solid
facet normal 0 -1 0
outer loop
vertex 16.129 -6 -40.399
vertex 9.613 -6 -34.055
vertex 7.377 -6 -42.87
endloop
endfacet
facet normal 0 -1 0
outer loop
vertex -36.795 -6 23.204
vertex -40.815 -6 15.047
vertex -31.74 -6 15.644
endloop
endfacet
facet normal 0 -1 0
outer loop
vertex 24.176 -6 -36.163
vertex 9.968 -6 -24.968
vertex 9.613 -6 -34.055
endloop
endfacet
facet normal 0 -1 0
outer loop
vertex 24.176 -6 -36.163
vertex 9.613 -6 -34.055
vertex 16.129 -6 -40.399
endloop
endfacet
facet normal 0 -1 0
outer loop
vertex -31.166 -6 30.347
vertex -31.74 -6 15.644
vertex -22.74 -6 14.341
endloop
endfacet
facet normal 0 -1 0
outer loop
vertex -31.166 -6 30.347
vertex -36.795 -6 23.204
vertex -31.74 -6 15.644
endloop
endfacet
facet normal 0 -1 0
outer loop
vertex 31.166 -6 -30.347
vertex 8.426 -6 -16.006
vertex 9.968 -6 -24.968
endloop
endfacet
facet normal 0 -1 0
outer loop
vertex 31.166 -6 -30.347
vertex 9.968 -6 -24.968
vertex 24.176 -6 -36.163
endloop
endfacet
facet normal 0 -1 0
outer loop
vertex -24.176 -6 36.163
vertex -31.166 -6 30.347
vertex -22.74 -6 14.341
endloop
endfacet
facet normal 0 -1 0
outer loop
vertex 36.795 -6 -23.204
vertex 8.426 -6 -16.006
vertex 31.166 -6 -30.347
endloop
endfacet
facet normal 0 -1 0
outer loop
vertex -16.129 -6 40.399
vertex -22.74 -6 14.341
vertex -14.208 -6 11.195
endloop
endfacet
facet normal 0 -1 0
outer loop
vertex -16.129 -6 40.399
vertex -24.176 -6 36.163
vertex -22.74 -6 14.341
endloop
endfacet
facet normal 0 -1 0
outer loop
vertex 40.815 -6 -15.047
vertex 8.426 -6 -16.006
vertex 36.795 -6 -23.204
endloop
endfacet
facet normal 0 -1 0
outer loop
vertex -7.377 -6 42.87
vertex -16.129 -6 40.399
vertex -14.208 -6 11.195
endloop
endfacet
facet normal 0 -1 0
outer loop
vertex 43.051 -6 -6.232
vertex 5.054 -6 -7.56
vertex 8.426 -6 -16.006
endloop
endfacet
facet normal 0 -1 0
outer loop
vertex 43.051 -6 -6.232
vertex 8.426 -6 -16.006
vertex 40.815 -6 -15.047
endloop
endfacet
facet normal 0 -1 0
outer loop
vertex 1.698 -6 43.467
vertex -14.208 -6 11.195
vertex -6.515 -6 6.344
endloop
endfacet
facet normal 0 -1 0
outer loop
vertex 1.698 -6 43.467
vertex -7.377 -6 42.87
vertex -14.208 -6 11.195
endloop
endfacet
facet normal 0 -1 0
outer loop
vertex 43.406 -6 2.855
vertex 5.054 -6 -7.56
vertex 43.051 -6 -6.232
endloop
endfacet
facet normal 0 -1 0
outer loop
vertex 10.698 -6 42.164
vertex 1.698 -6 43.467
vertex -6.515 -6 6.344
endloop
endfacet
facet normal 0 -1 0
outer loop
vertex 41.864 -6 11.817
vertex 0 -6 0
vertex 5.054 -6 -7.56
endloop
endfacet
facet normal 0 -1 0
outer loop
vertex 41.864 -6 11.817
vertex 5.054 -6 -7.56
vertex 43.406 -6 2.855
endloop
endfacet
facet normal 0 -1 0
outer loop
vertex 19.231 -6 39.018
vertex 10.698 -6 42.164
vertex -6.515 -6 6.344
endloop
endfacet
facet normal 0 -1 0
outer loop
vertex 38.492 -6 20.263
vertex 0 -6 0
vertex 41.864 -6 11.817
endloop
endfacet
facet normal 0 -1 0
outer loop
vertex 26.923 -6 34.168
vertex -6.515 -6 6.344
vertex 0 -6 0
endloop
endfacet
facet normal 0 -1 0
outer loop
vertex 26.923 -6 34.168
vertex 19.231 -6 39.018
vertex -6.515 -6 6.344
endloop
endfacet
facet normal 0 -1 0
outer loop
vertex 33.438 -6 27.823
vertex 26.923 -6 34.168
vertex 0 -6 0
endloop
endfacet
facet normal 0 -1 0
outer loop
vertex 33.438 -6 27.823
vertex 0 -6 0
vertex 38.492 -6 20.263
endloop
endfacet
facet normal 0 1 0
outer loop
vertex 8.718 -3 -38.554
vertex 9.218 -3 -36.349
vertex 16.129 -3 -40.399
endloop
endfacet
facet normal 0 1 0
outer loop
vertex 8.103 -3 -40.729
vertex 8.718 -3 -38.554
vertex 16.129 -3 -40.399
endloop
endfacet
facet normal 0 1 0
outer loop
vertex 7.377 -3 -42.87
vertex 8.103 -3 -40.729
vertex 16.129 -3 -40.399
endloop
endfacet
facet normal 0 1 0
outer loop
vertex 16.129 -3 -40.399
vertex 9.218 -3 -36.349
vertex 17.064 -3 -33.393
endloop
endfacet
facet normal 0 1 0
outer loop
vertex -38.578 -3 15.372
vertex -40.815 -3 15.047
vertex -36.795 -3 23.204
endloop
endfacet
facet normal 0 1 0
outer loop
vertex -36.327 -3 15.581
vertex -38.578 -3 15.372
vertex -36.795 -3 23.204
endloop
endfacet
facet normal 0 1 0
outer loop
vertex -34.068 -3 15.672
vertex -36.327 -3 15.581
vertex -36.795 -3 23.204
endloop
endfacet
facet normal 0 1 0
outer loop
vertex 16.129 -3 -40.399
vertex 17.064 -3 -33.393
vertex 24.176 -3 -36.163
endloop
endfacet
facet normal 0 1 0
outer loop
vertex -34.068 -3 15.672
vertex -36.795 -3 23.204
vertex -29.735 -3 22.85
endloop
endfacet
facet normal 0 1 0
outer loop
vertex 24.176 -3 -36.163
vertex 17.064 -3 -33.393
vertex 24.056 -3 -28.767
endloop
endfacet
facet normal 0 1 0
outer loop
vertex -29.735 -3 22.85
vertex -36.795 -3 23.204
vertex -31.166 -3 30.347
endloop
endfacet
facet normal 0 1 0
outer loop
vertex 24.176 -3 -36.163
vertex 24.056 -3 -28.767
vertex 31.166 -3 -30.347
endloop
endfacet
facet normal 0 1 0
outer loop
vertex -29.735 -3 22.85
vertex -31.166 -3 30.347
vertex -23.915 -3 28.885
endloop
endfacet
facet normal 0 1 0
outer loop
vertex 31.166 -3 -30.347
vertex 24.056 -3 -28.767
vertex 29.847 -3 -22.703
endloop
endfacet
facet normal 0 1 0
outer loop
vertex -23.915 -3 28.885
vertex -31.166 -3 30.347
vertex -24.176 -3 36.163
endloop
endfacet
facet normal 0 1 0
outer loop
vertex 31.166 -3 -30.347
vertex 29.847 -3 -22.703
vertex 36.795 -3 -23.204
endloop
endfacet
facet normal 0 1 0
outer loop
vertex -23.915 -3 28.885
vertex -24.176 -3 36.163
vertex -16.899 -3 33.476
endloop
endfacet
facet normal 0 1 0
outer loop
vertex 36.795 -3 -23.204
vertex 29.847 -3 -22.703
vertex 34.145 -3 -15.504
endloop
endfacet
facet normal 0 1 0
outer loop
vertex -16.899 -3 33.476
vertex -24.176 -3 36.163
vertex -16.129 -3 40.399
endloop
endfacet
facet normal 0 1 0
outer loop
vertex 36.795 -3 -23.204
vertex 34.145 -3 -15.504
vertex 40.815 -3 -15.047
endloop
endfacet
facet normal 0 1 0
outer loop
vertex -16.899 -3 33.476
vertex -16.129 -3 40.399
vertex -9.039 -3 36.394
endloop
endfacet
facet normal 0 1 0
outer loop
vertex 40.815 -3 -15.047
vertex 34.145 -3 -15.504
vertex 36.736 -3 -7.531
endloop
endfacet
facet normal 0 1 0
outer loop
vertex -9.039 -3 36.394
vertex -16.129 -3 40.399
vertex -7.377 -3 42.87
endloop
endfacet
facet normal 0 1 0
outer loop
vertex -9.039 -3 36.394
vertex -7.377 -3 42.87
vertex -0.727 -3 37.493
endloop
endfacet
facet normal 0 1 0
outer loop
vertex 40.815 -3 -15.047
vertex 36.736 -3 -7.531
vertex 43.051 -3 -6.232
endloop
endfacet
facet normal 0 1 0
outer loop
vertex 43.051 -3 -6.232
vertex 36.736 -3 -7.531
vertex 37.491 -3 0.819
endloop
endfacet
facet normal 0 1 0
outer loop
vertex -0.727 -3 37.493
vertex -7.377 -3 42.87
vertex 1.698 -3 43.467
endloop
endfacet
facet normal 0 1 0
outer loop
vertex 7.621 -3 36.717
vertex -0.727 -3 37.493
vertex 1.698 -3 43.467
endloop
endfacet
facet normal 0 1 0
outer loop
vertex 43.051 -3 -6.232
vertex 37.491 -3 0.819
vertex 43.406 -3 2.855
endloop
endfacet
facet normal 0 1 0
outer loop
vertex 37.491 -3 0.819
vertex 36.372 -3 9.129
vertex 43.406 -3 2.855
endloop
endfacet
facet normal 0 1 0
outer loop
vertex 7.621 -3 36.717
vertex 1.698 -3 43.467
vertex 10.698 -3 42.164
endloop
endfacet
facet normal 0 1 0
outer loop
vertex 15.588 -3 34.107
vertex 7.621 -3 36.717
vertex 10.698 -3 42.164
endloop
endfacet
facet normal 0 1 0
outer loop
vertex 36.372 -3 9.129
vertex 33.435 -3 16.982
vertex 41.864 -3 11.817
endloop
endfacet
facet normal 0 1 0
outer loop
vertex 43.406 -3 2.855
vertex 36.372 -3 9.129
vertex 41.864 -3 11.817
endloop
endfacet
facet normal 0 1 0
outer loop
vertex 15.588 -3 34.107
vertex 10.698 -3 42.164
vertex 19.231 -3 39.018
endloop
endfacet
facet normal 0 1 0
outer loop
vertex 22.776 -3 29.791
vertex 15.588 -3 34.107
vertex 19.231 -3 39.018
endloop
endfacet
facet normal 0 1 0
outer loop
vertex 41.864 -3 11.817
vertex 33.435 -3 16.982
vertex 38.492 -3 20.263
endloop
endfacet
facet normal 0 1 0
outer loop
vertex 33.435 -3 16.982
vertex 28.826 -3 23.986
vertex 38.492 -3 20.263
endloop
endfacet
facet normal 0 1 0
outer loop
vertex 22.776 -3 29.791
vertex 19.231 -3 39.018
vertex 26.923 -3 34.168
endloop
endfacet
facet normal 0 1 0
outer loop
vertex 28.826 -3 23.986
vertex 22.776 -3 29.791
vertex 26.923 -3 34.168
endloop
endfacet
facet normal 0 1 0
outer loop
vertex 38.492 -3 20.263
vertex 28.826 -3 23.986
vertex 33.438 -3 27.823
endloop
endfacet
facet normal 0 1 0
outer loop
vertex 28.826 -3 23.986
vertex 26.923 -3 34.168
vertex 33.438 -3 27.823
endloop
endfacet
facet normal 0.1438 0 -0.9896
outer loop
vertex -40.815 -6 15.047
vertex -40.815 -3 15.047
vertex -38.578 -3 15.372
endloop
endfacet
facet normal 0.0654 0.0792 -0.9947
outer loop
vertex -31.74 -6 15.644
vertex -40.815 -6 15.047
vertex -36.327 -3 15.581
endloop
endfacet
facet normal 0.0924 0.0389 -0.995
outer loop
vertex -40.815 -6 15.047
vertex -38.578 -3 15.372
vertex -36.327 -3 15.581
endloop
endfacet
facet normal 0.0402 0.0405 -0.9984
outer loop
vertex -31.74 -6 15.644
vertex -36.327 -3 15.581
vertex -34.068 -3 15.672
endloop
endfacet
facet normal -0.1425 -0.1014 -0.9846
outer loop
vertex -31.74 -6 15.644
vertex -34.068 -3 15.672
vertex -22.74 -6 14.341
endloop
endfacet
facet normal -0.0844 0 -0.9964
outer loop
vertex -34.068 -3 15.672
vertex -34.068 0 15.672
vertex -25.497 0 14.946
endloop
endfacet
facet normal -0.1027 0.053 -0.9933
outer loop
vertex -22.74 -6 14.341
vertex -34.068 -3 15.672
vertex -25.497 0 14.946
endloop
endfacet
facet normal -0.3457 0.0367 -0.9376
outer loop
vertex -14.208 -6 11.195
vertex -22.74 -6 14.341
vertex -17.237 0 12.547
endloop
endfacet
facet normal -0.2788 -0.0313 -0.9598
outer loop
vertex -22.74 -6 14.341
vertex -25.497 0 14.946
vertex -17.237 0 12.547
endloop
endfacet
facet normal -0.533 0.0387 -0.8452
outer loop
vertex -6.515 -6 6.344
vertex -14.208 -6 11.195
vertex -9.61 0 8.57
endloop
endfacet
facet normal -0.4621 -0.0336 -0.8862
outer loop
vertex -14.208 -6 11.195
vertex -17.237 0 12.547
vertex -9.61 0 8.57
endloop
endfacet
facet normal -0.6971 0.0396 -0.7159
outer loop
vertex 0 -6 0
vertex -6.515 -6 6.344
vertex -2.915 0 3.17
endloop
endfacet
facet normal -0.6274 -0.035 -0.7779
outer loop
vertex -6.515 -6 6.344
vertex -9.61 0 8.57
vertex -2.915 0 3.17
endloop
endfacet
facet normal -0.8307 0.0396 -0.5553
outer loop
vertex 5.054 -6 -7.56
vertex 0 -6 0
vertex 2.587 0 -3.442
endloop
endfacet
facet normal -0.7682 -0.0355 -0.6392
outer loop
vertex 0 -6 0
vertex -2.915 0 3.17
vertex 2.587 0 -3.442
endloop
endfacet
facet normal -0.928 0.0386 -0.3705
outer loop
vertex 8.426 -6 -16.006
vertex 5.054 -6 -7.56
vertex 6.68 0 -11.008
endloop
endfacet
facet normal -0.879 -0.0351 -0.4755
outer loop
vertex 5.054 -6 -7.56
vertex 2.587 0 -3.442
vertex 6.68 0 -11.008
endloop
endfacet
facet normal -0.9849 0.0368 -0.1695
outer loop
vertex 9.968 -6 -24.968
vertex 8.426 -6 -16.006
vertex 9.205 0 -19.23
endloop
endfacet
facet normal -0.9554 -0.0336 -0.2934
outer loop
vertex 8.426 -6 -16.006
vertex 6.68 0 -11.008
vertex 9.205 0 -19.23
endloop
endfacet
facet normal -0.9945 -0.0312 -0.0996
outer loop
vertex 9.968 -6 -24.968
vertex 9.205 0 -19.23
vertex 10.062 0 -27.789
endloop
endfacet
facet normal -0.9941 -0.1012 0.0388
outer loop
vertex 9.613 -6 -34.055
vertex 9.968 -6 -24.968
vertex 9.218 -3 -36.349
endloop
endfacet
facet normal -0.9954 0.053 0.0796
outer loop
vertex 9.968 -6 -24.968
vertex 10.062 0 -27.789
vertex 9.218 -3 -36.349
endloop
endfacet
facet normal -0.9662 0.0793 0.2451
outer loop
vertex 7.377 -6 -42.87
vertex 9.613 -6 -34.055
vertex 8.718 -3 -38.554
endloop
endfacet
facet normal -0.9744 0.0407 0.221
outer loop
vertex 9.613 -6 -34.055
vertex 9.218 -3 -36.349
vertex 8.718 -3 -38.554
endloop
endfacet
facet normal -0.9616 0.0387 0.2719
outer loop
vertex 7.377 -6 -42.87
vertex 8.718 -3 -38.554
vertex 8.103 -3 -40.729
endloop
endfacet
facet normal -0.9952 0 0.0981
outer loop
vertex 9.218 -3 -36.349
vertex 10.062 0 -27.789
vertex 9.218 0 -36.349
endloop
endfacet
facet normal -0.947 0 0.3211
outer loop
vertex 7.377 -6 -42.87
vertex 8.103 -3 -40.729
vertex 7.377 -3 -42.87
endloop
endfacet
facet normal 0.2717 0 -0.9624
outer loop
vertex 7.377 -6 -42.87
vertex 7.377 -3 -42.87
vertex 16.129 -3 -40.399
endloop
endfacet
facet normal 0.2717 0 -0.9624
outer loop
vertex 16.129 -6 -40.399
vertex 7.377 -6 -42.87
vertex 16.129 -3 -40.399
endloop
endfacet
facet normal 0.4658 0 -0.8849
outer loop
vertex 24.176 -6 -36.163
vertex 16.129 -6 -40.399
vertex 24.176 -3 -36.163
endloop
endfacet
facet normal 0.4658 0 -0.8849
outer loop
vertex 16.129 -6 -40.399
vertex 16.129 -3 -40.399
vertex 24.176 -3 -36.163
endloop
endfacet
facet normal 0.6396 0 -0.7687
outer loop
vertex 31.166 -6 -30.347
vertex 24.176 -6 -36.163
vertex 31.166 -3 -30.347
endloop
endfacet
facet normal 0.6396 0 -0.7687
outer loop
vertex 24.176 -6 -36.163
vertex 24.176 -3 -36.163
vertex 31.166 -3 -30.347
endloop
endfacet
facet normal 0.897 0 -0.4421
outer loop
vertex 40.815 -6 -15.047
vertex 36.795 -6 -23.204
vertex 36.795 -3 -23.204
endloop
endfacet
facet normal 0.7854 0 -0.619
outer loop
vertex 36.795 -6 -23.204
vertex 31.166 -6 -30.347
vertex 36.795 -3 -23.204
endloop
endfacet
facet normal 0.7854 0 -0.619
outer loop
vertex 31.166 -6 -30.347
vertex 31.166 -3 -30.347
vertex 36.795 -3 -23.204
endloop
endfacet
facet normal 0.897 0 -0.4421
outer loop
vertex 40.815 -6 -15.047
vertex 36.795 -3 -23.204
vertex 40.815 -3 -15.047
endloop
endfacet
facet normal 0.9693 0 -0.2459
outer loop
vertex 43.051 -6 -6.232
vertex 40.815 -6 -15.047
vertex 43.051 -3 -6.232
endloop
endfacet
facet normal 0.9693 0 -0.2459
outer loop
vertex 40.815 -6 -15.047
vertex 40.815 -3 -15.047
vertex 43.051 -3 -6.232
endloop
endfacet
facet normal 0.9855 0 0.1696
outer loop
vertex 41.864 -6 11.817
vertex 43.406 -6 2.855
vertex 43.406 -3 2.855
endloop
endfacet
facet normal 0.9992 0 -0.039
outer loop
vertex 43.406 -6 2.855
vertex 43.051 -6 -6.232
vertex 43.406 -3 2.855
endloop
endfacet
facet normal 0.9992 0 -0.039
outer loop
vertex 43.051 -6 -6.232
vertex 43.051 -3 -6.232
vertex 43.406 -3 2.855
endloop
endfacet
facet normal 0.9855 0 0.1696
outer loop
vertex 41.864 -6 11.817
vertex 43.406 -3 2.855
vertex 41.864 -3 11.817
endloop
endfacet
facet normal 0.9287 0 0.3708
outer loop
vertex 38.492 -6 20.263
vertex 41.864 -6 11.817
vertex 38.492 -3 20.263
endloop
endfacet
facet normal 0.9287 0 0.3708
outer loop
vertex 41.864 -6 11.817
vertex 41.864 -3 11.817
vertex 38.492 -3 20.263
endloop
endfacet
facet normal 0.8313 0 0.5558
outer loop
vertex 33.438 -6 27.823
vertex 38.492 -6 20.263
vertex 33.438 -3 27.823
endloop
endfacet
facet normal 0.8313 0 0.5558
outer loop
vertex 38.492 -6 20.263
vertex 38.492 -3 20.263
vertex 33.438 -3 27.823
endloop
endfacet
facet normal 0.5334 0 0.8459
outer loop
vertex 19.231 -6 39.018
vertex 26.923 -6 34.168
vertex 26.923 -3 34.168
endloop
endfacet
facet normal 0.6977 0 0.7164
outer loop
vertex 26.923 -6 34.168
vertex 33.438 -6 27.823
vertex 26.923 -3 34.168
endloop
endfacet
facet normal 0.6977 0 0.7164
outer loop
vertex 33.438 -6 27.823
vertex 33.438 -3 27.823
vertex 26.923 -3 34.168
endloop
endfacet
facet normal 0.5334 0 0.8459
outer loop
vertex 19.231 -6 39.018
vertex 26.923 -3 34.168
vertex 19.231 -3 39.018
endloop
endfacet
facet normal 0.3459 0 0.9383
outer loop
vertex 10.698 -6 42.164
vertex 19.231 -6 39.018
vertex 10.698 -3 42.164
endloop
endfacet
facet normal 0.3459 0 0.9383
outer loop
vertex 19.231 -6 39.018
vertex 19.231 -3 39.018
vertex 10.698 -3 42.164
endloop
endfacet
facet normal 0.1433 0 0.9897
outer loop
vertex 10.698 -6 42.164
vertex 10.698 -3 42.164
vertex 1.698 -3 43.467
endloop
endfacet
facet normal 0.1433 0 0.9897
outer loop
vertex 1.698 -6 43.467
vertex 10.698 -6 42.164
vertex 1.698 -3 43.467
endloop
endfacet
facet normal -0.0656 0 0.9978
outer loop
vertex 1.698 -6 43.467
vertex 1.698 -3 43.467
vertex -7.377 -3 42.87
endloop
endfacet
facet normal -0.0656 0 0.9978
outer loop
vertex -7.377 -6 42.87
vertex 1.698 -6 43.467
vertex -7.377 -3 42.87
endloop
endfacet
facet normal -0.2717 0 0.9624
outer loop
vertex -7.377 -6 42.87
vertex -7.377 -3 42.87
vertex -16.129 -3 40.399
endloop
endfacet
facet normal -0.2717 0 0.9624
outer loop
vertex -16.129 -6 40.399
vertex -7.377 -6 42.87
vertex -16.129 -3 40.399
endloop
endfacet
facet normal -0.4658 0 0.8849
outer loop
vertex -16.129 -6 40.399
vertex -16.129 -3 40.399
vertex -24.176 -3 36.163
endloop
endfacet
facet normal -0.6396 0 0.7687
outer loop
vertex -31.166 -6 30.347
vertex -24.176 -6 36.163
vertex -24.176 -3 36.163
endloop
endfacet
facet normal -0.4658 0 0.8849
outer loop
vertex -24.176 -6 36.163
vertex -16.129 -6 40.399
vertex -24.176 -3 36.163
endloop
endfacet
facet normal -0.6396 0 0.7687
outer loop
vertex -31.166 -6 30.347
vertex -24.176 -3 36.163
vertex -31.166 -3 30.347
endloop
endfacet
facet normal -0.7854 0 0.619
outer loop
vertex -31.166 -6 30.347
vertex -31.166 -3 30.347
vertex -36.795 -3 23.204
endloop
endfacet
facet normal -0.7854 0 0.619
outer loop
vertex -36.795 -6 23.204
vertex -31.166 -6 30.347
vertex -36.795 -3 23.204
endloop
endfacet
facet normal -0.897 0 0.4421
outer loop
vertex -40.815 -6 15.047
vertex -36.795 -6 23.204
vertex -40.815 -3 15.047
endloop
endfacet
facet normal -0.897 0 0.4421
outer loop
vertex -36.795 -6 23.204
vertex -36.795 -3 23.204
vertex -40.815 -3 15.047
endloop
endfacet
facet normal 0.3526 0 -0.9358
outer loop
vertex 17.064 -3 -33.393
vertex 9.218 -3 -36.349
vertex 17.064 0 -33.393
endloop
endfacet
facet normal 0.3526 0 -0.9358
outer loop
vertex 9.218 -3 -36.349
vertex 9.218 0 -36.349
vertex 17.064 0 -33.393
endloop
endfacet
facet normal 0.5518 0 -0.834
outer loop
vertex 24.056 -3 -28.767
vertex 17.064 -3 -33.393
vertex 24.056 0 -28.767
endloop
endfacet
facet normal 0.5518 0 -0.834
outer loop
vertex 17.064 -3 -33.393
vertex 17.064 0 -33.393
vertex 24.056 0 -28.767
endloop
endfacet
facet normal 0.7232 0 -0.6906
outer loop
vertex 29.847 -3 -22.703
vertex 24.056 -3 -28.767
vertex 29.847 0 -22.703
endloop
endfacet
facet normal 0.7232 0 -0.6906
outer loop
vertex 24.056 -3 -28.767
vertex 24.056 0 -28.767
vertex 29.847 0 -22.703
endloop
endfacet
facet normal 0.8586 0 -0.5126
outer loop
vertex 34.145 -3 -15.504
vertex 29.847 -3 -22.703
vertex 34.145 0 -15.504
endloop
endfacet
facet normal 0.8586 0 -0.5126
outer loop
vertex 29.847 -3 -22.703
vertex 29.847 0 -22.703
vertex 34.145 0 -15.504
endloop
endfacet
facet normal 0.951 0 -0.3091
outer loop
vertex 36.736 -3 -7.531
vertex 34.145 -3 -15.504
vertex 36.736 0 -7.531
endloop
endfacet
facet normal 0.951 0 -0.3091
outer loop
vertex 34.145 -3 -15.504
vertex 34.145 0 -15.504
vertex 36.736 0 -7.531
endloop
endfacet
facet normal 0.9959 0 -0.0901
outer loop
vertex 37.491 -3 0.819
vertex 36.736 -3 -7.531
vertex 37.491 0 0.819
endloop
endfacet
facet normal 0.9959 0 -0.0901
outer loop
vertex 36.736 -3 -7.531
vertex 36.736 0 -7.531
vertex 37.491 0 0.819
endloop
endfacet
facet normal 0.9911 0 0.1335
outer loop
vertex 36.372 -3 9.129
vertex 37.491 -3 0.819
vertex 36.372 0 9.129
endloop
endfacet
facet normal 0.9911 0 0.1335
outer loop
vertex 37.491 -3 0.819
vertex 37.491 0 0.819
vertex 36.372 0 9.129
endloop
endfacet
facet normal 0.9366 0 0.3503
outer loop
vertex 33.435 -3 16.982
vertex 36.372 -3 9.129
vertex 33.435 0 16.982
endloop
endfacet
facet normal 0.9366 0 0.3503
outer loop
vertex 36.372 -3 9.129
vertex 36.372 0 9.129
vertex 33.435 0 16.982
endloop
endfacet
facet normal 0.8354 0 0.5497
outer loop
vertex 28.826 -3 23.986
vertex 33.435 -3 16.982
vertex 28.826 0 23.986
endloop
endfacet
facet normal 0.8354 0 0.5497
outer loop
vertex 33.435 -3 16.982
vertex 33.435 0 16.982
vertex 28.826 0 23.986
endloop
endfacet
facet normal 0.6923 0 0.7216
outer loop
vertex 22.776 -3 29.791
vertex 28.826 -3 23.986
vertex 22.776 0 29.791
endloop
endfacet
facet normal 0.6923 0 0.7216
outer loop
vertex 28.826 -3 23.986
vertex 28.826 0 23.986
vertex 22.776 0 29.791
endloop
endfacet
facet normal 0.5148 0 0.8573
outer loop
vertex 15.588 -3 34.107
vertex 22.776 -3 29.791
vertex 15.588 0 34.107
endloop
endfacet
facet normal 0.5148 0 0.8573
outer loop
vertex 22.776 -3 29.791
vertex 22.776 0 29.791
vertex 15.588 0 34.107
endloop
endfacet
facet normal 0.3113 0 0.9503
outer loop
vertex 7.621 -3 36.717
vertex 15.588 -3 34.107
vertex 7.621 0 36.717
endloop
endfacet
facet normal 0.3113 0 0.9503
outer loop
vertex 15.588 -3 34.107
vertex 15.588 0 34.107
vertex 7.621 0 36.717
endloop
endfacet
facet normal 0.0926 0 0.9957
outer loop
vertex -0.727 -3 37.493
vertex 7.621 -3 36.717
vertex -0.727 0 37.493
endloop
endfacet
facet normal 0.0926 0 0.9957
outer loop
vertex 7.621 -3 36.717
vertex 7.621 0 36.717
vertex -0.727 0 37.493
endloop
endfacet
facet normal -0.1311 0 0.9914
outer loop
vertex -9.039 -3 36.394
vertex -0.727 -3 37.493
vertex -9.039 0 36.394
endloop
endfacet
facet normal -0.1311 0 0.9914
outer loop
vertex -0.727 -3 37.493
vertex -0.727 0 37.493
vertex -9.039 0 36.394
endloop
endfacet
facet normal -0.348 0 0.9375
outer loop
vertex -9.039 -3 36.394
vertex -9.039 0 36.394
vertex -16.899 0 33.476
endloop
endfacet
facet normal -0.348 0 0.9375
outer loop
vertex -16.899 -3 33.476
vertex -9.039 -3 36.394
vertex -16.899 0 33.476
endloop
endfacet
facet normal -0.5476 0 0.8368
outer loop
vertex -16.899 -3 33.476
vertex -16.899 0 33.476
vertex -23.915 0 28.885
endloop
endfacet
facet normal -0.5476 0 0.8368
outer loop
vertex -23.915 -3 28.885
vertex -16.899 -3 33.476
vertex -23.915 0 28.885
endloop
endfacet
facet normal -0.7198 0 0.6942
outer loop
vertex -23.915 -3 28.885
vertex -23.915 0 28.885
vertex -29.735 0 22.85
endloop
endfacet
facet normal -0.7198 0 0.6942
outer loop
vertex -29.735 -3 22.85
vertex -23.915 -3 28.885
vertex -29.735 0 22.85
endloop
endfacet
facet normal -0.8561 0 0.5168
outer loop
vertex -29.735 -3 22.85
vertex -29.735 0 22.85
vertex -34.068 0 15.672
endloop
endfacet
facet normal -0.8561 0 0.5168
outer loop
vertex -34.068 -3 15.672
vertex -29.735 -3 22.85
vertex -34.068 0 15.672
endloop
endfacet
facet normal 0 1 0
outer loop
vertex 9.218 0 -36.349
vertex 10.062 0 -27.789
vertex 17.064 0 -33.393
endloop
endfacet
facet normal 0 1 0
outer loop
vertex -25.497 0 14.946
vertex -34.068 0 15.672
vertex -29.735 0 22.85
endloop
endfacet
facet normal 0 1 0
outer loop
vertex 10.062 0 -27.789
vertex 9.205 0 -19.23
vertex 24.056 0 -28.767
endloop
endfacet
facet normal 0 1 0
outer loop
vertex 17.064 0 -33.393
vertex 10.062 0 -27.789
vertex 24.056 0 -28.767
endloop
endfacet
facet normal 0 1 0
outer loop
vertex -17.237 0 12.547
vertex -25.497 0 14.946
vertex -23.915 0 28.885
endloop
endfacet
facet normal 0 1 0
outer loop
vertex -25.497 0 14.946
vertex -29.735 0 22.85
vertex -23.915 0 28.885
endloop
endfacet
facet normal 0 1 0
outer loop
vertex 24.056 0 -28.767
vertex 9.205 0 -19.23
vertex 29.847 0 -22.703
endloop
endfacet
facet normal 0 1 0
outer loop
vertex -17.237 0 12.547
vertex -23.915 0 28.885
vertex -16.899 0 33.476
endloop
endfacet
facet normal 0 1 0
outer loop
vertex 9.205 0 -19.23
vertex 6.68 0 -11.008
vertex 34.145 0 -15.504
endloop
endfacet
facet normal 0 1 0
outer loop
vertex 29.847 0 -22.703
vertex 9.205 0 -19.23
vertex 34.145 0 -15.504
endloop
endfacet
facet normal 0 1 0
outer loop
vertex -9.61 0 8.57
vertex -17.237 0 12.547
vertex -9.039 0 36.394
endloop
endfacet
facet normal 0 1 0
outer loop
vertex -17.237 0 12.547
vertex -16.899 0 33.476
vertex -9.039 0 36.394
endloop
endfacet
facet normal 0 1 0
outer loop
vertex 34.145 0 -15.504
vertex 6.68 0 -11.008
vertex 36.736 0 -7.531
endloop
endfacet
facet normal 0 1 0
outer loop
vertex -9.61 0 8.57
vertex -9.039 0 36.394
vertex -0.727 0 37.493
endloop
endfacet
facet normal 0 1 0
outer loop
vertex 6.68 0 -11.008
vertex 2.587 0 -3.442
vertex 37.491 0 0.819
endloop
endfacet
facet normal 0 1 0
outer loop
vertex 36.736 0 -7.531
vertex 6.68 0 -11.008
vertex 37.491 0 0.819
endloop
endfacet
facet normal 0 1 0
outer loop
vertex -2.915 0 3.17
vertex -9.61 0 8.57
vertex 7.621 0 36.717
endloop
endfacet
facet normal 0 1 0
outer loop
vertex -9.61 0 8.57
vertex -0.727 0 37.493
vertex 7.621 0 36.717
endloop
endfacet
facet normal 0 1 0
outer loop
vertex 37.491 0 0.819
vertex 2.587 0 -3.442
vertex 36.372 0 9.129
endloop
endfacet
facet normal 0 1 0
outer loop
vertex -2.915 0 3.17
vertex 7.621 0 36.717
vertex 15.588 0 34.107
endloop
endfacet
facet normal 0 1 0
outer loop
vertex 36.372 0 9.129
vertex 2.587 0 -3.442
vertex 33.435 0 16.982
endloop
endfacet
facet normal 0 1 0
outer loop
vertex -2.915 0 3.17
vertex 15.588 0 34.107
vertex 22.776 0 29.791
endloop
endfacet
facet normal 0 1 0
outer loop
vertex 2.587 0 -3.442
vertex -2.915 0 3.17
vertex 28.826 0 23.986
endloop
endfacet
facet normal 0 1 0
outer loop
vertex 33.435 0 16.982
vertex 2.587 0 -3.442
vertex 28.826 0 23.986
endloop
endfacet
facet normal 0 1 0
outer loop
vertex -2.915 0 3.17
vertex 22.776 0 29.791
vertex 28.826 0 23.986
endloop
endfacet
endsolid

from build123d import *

# Parameters (mm, degrees)
F0_R     = 37.5
F1_DEPTH = 3
F2_R     = 43.5
F3_DEPTH = 3
F5_DEPTH = 25


with BuildPart() as f1:
    # F0 (on Front) → F1 (new body)
    with BuildSketch(Plane.XZ):
        Circle(F0_R)
    extrude(amount=F1_DEPTH)

    # F2 (on face) → F3 (join)
    with BuildSketch(Plane.XZ.offset(3)):
        Circle(F2_R)
    extrude(amount=F3_DEPTH)

    # F4 (on face) → F5 (cut)
    with BuildSketch(Plane(origin=(0, 0, 0), x_dir=(-1, 0, 0), z_dir=(0, 1, 0))):
        with BuildLine():
            ThreePointArc((40.8147967737, 15.0466728654), (0, 0), (-7.376597443, -42.8699872891))
            ThreePointArc((-7.376597443, -42.8699872891), (33.4381993307, -27.8233144237), (40.8147967737, 15.0466728654))
        make_face()
    extrude(amount=-F5_DEPTH, mode=Mode.SUBTRACT)


solid = f1.part
